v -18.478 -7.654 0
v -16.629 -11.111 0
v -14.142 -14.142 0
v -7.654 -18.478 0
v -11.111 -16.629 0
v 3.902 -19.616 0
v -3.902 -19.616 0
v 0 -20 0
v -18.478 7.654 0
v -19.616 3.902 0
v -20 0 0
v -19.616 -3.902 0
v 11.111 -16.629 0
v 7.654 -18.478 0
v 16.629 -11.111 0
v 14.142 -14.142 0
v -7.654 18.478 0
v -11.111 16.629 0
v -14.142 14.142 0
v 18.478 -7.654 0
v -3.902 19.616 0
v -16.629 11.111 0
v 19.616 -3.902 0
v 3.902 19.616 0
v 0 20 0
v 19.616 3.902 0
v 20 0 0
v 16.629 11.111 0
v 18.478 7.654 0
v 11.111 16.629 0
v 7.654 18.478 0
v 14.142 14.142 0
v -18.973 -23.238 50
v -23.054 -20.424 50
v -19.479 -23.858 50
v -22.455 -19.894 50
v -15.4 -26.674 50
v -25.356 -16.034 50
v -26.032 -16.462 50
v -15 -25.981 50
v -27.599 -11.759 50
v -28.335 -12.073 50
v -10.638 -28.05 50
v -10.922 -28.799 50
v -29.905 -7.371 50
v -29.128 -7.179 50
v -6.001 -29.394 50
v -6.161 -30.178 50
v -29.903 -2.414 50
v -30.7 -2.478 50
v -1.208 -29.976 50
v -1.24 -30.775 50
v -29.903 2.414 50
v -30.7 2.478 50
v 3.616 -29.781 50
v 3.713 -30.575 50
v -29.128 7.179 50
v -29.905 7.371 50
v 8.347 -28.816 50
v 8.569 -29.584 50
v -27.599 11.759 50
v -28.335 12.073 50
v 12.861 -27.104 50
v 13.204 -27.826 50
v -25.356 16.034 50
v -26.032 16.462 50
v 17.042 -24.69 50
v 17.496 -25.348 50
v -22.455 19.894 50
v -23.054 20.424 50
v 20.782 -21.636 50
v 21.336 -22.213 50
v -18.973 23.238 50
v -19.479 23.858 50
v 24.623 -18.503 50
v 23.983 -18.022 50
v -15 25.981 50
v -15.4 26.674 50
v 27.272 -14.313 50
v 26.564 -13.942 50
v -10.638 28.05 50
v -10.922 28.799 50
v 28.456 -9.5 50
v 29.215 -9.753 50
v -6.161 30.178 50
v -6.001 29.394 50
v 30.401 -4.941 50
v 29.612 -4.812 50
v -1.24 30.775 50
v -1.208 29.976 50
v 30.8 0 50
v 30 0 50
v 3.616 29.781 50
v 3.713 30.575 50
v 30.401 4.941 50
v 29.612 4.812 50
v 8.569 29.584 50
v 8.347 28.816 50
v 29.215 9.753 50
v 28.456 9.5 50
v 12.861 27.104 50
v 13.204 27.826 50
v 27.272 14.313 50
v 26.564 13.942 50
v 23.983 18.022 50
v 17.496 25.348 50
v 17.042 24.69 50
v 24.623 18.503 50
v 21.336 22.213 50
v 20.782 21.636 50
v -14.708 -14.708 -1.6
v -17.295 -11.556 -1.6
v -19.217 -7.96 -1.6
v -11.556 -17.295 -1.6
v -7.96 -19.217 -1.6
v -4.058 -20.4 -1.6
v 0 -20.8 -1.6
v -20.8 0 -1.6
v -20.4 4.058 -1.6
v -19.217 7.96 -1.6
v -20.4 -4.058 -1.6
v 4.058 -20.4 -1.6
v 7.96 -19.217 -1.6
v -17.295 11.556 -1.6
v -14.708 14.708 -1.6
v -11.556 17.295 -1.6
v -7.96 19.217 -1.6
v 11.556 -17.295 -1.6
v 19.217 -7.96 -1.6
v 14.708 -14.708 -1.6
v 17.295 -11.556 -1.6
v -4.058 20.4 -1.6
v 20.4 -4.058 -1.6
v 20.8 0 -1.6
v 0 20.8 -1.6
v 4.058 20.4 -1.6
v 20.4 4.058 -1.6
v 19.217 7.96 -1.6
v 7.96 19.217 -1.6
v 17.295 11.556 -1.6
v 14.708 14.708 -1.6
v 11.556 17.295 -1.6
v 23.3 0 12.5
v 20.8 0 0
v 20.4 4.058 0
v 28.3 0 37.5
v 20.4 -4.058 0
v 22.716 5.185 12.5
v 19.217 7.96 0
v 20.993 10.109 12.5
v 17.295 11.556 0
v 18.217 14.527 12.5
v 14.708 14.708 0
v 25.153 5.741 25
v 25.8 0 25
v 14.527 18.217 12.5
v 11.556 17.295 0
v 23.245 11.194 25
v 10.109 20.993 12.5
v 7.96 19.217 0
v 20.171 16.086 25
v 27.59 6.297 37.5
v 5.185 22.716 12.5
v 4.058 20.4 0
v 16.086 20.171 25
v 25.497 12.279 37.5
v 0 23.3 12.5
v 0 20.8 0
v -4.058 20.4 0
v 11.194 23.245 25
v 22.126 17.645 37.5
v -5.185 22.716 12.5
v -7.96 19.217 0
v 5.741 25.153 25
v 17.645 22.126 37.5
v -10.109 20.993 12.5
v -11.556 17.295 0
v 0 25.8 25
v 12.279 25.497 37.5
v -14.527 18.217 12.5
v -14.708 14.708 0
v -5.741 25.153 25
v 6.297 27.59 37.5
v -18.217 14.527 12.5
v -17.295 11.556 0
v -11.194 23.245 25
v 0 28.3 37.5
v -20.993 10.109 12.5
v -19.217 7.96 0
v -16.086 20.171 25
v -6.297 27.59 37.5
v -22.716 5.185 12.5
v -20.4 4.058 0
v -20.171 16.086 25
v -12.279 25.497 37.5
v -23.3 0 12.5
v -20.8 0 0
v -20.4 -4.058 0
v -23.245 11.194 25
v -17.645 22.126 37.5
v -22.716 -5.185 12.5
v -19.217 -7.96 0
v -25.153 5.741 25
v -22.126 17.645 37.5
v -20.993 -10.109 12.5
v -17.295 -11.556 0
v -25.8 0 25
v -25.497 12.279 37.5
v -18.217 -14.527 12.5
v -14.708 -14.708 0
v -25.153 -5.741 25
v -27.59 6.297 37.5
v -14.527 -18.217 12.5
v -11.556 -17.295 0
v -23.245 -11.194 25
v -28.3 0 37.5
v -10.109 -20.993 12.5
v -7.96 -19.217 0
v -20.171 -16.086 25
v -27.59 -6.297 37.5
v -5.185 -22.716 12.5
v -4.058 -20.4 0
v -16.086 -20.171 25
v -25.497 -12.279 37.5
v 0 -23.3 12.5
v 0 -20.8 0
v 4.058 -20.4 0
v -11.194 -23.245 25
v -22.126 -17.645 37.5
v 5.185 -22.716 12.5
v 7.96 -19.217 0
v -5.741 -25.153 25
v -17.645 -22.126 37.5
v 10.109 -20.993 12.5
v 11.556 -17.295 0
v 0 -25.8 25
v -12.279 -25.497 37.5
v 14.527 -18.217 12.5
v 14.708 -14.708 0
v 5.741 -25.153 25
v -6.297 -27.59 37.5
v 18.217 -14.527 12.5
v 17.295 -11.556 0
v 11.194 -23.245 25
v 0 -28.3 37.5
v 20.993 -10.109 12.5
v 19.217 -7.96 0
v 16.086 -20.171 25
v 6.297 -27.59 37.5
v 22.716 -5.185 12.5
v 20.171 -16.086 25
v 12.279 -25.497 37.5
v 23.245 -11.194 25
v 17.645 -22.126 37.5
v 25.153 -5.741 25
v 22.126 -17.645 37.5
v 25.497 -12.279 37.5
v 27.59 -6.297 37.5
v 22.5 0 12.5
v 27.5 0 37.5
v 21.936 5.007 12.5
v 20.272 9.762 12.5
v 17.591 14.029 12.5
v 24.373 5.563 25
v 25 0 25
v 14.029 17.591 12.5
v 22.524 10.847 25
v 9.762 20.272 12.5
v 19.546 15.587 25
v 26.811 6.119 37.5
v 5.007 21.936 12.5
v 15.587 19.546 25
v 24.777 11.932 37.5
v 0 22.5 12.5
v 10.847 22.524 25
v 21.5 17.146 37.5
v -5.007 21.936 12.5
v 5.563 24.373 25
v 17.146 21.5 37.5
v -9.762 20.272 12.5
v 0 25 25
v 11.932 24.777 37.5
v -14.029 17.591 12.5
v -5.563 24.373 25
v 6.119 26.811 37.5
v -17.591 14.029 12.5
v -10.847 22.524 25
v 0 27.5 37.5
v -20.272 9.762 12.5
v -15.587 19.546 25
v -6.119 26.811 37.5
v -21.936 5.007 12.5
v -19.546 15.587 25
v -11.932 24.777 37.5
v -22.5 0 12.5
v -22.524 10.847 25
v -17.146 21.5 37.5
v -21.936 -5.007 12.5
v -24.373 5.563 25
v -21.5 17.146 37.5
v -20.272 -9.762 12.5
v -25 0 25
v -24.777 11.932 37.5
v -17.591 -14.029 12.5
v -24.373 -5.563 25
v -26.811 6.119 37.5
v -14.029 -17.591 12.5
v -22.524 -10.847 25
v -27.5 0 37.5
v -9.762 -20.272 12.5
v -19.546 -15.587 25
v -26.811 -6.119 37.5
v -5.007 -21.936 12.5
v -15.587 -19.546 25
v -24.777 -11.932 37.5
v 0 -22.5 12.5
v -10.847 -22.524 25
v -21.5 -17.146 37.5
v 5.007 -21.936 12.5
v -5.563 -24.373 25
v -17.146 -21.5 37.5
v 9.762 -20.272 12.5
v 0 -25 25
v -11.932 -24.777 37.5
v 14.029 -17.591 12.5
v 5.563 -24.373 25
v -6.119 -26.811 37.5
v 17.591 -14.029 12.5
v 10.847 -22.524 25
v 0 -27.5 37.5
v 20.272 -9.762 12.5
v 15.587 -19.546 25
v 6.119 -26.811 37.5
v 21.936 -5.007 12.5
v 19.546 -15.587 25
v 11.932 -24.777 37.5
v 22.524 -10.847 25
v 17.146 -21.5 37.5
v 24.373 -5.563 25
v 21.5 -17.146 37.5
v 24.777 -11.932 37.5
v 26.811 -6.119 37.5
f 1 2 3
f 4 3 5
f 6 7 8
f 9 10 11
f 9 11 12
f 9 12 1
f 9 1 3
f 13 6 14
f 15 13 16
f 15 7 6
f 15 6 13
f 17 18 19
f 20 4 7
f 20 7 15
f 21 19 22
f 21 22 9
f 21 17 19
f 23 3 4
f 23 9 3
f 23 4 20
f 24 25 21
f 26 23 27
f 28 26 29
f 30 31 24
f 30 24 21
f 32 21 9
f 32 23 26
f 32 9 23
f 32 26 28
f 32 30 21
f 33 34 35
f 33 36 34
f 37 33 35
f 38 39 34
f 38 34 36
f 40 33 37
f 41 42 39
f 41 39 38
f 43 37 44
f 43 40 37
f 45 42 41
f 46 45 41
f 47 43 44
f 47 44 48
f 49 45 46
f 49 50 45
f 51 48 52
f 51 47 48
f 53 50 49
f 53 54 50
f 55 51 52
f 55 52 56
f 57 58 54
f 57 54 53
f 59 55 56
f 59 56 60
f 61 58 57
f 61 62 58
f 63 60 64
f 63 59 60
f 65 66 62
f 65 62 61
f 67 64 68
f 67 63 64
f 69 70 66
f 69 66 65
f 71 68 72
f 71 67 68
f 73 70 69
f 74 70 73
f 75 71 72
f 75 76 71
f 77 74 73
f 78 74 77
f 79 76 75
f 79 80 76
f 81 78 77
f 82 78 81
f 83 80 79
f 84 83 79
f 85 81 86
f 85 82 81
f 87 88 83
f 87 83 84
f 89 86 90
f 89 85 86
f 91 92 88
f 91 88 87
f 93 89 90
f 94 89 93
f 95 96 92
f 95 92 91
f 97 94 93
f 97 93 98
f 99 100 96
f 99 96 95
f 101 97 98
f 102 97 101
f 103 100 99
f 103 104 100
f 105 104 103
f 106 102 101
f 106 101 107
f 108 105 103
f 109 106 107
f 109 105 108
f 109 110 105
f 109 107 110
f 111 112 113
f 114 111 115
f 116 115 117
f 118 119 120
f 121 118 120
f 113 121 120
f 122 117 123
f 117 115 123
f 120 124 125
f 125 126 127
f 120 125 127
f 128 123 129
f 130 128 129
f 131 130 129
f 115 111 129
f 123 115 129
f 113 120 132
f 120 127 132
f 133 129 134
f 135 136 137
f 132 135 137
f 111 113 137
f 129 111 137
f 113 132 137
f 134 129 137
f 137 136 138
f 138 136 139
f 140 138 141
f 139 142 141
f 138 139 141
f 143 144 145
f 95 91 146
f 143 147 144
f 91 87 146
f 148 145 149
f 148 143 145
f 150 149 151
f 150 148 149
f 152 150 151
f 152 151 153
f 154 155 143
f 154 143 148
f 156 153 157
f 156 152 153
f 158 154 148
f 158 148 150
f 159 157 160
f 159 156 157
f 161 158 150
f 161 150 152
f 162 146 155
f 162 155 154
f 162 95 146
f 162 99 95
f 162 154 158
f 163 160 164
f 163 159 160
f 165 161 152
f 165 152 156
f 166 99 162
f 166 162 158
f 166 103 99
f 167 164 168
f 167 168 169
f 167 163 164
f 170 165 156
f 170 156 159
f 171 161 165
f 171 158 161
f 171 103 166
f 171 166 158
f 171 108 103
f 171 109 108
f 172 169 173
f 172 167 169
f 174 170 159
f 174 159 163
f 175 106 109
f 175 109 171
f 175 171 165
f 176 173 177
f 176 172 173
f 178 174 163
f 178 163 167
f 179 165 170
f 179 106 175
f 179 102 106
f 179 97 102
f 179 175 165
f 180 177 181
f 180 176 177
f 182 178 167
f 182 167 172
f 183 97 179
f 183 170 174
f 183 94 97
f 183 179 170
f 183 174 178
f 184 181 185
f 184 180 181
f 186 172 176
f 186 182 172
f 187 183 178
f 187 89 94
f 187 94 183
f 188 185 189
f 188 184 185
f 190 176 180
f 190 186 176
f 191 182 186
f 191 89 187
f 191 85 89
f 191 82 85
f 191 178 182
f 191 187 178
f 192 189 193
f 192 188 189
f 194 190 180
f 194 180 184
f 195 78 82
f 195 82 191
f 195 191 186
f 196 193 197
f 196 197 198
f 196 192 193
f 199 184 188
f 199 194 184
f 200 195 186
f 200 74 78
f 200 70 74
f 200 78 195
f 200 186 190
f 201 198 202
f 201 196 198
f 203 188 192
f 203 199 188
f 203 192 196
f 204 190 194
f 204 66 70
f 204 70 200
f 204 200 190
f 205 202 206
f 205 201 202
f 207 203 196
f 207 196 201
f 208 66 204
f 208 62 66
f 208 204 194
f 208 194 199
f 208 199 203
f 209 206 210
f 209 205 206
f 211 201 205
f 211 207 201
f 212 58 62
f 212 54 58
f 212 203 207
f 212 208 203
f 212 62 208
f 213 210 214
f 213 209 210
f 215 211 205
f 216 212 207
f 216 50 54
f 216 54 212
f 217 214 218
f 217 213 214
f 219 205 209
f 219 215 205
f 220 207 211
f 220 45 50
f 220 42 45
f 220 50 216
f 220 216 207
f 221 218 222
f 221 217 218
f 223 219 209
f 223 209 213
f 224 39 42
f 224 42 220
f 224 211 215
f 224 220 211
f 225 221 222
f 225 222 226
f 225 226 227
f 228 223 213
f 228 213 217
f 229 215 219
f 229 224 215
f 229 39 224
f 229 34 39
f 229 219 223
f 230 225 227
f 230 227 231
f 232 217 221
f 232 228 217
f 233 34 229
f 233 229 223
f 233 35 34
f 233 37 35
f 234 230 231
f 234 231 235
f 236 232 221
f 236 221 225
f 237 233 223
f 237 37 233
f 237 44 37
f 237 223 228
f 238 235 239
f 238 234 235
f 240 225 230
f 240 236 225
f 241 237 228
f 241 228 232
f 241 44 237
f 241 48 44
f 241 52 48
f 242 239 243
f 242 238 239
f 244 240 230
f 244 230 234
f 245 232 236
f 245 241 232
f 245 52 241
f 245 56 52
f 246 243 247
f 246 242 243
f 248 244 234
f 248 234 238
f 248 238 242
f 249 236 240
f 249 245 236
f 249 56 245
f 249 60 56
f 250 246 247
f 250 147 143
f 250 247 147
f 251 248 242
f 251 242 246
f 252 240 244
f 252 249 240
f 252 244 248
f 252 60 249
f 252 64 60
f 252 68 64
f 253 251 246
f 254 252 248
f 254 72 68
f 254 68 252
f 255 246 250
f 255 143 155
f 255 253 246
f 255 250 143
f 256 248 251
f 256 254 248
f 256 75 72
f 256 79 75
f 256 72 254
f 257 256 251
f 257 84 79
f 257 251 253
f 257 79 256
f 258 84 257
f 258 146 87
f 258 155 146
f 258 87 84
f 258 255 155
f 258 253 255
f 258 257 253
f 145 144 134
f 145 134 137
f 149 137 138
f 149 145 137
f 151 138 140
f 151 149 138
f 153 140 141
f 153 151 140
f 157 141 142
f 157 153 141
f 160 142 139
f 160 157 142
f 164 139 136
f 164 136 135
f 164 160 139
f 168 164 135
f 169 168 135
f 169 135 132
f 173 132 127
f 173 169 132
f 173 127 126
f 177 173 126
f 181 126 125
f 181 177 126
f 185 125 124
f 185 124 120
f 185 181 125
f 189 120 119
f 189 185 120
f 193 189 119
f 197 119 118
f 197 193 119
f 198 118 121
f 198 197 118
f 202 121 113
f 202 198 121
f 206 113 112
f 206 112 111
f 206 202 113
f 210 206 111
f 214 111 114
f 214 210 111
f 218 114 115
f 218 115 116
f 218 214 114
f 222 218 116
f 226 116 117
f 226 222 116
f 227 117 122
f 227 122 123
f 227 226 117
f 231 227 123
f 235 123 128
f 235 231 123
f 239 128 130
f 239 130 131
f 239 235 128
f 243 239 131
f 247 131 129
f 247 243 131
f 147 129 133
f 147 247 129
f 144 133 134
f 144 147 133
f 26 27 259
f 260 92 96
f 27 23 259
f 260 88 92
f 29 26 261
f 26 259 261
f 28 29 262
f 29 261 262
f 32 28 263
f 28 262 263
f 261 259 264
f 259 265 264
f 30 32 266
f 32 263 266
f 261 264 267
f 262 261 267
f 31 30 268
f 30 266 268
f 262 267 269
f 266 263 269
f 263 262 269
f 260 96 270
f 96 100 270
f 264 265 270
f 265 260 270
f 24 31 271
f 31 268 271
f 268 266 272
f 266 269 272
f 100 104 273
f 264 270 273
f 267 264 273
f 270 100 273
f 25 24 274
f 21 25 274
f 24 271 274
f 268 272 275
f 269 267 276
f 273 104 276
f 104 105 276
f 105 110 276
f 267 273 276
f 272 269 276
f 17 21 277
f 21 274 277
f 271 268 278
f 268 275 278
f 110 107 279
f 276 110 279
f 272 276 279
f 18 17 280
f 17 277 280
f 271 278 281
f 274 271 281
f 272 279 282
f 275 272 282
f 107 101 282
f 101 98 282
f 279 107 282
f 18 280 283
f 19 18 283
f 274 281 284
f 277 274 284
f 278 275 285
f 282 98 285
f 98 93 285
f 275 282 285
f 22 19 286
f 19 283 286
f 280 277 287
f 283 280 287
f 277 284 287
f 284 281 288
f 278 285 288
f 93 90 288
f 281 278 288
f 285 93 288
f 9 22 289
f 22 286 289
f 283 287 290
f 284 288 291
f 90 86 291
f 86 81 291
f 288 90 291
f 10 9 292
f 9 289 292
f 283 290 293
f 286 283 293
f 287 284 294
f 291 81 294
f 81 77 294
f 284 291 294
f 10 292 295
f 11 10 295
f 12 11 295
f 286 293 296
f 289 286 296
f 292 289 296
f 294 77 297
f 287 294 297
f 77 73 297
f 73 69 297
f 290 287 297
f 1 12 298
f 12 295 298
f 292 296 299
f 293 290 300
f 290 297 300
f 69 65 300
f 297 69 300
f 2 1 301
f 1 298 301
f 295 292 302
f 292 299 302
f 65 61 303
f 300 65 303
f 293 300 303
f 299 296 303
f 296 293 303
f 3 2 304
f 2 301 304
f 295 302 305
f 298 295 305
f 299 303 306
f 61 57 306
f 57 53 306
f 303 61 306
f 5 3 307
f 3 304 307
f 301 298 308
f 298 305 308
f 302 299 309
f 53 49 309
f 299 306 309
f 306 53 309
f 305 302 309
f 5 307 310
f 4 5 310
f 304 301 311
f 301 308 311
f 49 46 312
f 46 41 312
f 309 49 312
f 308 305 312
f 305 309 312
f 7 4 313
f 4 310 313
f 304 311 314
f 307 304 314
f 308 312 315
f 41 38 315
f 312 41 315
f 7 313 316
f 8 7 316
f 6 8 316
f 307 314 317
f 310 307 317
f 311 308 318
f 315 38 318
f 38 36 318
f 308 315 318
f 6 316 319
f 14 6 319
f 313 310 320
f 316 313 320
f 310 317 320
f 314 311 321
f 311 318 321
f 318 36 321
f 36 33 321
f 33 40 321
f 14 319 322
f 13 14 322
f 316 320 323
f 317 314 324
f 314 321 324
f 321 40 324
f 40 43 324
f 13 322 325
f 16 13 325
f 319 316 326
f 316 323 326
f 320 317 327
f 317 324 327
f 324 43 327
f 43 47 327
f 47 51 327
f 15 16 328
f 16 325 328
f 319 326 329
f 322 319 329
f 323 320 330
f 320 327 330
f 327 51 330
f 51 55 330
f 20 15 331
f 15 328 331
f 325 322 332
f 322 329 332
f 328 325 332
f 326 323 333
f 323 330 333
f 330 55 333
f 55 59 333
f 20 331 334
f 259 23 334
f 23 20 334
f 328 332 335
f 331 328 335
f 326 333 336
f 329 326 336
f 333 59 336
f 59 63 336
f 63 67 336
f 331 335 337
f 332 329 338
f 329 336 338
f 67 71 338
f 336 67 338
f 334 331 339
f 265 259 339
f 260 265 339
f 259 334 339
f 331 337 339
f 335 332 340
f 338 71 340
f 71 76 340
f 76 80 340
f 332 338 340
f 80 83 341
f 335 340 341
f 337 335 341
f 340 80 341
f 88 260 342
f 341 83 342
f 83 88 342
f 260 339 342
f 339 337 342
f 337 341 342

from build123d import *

# Parameters (mm, degrees)
SKETCH_R      = 20.8
EXTRUDE_DEPTH = 1.6


with BuildPart() as cone001:
    # Cone001 → Cone001 (revolve)
    with BuildSketch(Plane.XZ):
        Polygon((0, 0), (20, 0), (30, 50), (0, 50), align=None)
    revolve(axis=Axis((0, 0, 0), (0, 0, 1)))


with BuildPart() as cut:
    # Cone → Cone (revolve)
    with BuildSketch(Plane.XZ):
        Polygon((0, 0), (20.8, 0), (30.8, 50), (0, 50), align=None)
    revolve(axis=Axis((0, 0, 0), (0, 0, 1)))

    # Cut: cut Cone001
    add(cone001.part, mode=Mode.SUBTRACT)


with BuildPart() as fusion:
    # Sketch → Extrude (new body)
    with BuildSketch(Plane.XY):
        Circle(SKETCH_R)
    extrude(amount=-EXTRUDE_DEPTH)

    # Fusion: union Cut
    add(cut.part)


solid = fusion.part
